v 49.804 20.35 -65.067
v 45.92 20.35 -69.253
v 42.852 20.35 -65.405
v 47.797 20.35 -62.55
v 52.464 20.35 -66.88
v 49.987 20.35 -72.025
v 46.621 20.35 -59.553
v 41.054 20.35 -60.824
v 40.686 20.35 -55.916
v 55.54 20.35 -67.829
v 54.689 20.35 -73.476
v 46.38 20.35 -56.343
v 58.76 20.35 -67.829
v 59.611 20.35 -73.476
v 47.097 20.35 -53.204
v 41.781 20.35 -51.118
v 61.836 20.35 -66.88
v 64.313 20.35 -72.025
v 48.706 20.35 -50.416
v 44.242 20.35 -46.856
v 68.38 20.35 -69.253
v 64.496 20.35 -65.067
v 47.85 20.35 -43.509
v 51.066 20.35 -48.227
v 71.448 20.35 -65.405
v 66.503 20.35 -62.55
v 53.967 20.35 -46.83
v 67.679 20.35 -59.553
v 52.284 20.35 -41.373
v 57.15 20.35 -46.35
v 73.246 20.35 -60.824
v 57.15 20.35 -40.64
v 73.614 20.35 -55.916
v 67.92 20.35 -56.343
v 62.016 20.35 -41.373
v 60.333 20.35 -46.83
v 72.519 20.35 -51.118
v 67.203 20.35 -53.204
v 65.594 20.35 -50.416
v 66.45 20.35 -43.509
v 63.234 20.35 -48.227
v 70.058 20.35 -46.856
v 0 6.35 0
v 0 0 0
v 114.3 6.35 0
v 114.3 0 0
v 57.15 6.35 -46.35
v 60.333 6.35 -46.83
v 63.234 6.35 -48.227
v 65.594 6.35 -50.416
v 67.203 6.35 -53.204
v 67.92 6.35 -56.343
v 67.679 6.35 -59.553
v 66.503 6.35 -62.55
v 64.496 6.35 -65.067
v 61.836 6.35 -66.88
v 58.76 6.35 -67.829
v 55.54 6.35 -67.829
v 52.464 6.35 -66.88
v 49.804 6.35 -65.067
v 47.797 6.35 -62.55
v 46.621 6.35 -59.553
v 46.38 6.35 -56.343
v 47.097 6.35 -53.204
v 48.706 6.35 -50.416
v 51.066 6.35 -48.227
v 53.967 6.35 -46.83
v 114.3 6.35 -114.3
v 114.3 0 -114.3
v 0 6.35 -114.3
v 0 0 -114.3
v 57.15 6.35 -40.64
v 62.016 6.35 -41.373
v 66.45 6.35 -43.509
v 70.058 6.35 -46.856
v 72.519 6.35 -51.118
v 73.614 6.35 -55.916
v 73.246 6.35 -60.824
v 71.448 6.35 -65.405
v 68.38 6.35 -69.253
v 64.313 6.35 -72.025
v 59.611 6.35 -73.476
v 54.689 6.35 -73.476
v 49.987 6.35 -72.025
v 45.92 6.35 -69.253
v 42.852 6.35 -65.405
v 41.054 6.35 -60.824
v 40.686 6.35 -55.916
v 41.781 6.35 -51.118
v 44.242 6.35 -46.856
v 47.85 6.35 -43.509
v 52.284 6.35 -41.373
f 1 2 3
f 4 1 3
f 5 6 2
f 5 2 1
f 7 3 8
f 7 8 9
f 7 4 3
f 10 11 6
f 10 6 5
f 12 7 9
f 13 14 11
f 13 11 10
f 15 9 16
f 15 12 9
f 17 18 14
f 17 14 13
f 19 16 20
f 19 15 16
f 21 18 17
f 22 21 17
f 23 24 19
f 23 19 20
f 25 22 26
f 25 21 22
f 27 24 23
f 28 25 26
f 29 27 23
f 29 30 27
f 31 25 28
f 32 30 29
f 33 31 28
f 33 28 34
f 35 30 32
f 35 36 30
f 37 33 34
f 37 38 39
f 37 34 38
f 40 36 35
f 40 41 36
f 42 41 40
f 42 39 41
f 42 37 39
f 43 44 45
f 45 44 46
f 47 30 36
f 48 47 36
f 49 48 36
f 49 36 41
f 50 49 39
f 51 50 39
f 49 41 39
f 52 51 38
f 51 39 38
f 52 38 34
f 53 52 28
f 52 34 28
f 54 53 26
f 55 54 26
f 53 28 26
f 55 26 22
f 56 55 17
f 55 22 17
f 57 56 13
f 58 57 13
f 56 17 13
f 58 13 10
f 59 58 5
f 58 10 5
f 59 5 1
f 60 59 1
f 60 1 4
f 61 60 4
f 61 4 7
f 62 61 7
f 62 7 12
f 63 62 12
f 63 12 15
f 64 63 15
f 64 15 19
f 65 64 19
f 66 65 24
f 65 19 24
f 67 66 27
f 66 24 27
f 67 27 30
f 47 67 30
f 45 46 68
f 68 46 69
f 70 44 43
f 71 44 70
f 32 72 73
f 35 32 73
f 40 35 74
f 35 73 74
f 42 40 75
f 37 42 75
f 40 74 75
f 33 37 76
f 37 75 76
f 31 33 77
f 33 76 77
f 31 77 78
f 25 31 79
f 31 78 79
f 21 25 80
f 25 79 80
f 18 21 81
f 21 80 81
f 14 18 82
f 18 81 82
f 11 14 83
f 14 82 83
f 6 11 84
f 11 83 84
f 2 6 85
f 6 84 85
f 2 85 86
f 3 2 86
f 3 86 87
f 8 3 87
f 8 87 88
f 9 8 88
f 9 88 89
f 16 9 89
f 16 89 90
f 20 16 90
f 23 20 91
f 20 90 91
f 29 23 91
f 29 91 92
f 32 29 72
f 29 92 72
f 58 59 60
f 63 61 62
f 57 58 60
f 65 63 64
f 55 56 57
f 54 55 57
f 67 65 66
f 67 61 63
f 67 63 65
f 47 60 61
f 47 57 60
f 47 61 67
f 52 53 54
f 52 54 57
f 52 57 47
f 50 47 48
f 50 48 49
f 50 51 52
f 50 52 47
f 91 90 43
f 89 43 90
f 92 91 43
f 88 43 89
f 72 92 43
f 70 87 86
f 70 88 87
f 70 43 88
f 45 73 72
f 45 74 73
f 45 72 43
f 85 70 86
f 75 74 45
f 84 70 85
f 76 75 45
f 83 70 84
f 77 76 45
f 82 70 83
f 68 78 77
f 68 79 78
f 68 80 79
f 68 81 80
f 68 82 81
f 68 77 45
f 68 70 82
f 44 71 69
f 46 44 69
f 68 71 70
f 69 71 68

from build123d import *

# Parameters (mm, degrees)
SKETCH1_W           = 114.3
SKETCH1_H           = 114.3
BOSS_EXTRUDE1_DEPTH = 6.35
SKETCH2_R           = 16.51
BOSS_EXTRUDE2_DEPTH = 14
SKETCH3_R           = 10.8
CUT_EXTRUDE1_DEPTH  = 14


with BuildPart() as part:
    # Sketch1 → Boss-Extrude1 (new body)
    with BuildSketch(Plane(origin=(0, 0, 0), x_dir=(1, 0, 0), z_dir=(0, 1, 0))):
        with Locations((57.15, 57.15)):
            Rectangle(SKETCH1_W, SKETCH1_H)
    extrude(amount=BOSS_EXTRUDE1_DEPTH)

    # Sketch2 → Boss-Extrude2 (add)
    with BuildSketch(Plane(origin=(0, 6.35, 0), x_dir=(1, 0, 0), z_dir=(0, 1, 0))):
        with Locations(Location((57.15, 57.15, 0), (0, 0, 270))):
            Circle(SKETCH2_R)
    extrude(amount=BOSS_EXTRUDE2_DEPTH)

    # Sketch3 → Cut-Extrude1 (cut)
    with BuildSketch(Plane(origin=(0, 20.35, 0), x_dir=(1, 0, 0), z_dir=(0, 1, 0))):
        with Locations(Location((57.15, 57.15, 0), (0, 0, 270))):
            Circle(SKETCH3_R)
    extrude(amount=-CUT_EXTRUDE1_DEPTH, mode=Mode.SUBTRACT)


solid = part.part
